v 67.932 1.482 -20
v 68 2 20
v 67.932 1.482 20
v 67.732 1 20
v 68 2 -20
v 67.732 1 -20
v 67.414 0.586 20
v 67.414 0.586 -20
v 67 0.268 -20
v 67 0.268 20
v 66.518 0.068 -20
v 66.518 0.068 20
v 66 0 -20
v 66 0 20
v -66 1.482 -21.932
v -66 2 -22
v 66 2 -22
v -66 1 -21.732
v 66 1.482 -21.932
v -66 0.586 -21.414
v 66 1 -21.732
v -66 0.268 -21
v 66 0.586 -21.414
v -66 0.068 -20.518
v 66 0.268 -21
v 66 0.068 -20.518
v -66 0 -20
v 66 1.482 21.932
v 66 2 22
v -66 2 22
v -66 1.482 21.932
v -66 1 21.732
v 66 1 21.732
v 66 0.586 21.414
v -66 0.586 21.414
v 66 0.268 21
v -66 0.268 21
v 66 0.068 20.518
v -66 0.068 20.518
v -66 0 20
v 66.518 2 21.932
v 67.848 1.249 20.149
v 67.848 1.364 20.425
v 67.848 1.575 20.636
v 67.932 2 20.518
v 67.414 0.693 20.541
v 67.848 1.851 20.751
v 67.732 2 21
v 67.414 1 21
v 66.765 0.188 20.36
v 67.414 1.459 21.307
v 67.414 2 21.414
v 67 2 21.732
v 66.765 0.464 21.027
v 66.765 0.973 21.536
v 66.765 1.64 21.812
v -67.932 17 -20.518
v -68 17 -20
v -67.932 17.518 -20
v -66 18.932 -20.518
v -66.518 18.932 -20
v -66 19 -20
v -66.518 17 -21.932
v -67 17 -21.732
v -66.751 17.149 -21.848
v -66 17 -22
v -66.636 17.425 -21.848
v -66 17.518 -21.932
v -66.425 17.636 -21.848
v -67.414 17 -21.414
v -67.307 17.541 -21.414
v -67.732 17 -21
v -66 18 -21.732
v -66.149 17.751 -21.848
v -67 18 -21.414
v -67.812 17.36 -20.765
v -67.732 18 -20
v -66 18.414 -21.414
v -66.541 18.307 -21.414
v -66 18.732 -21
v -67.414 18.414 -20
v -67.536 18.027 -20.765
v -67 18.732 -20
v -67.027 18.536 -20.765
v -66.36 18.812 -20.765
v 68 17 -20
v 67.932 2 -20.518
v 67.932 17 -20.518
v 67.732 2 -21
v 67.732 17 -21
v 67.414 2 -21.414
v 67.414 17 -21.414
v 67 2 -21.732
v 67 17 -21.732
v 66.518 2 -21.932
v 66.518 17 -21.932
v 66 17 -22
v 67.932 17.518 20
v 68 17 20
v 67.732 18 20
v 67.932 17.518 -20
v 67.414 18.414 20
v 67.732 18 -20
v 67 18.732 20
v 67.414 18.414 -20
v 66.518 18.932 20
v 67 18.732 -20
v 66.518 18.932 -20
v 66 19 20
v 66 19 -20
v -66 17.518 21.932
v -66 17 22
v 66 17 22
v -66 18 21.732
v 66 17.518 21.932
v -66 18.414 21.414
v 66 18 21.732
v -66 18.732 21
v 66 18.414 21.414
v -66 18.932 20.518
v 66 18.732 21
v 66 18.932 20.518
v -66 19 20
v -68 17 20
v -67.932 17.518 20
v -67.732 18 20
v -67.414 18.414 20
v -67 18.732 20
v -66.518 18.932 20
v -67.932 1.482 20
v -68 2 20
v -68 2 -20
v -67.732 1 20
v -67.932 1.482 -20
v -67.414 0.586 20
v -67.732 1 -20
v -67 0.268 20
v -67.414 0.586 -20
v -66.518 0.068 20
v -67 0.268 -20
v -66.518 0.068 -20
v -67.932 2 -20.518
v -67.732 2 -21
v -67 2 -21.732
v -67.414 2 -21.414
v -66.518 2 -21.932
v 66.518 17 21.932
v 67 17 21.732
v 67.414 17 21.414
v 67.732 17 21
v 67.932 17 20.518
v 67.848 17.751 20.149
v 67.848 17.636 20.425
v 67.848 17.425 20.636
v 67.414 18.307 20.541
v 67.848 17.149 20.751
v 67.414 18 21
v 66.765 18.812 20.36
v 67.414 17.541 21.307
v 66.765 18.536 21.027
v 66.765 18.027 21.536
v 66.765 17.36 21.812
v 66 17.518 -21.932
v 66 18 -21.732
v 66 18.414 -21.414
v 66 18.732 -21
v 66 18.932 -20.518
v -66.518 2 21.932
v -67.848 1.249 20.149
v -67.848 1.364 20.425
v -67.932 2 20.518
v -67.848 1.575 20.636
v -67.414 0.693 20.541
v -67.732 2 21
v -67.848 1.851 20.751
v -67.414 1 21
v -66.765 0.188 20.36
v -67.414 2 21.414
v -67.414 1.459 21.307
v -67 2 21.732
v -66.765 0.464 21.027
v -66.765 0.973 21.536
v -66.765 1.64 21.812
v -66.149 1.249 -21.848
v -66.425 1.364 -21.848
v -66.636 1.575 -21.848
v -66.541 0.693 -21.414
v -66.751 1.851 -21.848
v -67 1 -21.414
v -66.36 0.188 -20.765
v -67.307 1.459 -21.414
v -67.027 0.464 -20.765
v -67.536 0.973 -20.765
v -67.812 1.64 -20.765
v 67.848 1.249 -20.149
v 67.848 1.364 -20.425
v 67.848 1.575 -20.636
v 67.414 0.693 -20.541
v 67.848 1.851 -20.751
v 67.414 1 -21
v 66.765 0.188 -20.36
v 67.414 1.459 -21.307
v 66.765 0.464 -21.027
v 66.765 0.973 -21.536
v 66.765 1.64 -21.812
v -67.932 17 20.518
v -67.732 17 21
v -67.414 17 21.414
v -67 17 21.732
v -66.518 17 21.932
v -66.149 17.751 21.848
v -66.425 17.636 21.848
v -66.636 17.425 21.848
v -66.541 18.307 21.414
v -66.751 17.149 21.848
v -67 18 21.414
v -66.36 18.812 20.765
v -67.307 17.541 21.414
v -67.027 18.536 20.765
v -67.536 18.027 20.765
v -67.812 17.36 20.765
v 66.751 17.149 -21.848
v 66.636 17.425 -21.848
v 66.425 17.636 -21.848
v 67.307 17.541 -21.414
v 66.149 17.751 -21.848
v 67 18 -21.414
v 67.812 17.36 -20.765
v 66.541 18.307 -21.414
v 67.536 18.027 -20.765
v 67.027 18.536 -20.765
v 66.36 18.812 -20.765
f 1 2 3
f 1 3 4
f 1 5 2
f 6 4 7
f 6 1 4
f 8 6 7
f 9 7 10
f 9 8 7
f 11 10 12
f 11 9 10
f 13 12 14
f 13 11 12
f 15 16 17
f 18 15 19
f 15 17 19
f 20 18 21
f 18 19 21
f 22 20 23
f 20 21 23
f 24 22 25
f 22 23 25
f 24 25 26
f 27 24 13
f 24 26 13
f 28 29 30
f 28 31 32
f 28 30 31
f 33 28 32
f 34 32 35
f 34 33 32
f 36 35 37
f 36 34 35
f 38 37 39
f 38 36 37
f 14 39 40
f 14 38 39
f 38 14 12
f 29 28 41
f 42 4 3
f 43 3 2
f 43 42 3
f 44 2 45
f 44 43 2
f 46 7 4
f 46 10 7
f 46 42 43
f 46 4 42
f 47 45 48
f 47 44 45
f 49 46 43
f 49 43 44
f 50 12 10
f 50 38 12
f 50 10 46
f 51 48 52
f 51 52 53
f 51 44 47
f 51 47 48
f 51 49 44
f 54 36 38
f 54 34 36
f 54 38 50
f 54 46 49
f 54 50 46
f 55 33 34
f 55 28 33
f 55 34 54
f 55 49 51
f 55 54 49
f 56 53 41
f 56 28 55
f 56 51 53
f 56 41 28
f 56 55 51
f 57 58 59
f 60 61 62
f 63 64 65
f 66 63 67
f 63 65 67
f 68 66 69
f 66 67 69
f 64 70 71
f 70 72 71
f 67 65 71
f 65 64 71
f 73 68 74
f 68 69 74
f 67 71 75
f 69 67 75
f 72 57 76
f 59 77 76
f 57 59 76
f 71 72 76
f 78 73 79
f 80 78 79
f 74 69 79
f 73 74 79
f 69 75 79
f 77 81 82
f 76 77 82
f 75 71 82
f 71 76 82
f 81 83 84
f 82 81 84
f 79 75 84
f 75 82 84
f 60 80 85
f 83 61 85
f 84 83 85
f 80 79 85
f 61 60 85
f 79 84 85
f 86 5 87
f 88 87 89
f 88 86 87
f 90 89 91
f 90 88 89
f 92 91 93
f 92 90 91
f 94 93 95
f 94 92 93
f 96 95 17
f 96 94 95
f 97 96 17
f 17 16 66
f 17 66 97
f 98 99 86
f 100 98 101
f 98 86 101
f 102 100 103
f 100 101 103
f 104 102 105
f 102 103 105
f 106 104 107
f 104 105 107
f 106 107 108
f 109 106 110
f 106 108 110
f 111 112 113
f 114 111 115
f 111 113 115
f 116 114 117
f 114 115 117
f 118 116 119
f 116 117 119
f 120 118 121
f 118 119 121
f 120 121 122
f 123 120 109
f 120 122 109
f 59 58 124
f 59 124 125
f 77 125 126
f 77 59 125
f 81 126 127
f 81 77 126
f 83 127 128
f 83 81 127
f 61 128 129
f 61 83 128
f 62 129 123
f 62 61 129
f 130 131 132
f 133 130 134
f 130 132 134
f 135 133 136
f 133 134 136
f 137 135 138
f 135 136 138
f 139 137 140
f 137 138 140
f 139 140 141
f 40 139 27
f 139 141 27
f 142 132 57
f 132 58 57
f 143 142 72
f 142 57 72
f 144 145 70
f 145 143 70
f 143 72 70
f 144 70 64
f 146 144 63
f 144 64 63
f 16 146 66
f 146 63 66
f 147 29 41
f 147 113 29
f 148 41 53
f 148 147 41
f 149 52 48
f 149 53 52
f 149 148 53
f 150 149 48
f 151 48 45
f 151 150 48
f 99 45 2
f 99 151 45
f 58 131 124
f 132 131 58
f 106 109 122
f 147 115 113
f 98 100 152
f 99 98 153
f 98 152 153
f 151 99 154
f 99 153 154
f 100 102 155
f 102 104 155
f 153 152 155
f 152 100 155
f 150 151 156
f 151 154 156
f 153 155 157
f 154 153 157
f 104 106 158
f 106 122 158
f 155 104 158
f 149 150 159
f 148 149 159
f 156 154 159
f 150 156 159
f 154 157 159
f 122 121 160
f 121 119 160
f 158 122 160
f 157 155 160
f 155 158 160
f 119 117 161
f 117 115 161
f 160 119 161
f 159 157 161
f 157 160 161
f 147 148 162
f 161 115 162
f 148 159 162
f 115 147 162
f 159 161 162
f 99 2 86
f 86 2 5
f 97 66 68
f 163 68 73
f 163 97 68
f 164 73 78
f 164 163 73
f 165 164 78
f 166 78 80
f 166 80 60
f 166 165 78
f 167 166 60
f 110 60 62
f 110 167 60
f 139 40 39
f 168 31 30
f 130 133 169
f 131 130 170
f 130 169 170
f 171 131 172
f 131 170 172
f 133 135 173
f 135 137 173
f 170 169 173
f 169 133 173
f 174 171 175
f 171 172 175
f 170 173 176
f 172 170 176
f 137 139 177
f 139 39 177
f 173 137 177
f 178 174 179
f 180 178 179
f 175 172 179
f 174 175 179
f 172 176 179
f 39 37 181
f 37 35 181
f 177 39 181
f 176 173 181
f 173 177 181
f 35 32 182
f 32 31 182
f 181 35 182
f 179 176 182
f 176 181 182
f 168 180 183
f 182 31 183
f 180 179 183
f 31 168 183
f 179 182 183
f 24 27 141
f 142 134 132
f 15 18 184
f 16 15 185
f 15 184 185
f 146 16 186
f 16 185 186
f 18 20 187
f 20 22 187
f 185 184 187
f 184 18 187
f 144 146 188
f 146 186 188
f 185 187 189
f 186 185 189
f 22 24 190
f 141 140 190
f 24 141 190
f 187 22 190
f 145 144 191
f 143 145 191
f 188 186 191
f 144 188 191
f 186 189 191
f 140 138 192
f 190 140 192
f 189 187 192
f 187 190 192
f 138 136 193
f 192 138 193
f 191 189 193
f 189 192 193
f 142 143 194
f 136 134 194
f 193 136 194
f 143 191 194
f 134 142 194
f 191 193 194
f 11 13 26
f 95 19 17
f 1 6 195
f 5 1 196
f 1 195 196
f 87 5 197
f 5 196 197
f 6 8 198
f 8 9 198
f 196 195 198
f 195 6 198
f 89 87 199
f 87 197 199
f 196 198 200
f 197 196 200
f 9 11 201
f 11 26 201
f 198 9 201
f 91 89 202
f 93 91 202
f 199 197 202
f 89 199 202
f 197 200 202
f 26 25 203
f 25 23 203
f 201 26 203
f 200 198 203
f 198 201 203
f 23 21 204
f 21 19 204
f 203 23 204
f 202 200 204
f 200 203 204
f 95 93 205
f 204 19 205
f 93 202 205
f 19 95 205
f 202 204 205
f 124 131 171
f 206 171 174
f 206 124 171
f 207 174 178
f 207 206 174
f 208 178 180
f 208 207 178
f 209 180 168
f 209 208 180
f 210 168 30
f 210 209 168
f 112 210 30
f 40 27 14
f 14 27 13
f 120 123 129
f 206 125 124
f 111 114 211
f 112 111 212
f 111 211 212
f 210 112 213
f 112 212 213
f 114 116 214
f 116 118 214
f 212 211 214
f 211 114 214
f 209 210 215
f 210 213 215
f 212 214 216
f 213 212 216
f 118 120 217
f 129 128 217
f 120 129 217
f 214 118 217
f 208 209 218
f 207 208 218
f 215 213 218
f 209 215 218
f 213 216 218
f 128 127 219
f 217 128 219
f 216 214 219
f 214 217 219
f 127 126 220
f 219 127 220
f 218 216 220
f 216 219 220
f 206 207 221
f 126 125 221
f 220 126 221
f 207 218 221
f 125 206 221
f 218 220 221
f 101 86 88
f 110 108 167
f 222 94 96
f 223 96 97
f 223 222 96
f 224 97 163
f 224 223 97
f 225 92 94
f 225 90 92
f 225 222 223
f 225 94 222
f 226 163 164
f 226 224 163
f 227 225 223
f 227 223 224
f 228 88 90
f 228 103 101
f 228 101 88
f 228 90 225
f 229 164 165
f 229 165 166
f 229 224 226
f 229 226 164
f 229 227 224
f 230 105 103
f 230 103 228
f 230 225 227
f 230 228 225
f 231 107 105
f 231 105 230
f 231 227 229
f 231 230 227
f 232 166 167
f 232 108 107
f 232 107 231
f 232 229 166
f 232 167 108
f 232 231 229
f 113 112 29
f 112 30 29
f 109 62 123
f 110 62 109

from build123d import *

# Parameters (mm, degrees)
SKETCH1_W           = 136
SKETCH1_H           = 44
BOSS_EXTRUDE1_DEPTH = 19
FILLET1_R           = 2


with BuildPart() as part:
    # Sketch1 → Boss-Extrude1 (new body)
    with BuildSketch(Plane(origin=(0, 0, 0), x_dir=(1, 0, 0), z_dir=(0, 1, 0))):
        Rectangle(SKETCH1_W, SKETCH1_H)
    extrude(amount=BOSS_EXTRUDE1_DEPTH)

    # Fillet1
    fillet1_edges = [part.edges().sort_by_distance(p)[0] for p in [
        (-68, 19, 0),
        (0, 19, 22),
        (68, 19, 0),
        (0, 0, 22),
        (-68, 0, 0),
        (0, 0, -22),
        (68, 0, 0),
        (68, 9.5, 22),
        (-68, 9.5, 22),
        (-68, 9.5, -22),
        (68, 9.5, -22),
        (0, 19, -22),
    ]]
    fillet(fillet1_edges, radius=FILLET1_R)


solid = part.part
